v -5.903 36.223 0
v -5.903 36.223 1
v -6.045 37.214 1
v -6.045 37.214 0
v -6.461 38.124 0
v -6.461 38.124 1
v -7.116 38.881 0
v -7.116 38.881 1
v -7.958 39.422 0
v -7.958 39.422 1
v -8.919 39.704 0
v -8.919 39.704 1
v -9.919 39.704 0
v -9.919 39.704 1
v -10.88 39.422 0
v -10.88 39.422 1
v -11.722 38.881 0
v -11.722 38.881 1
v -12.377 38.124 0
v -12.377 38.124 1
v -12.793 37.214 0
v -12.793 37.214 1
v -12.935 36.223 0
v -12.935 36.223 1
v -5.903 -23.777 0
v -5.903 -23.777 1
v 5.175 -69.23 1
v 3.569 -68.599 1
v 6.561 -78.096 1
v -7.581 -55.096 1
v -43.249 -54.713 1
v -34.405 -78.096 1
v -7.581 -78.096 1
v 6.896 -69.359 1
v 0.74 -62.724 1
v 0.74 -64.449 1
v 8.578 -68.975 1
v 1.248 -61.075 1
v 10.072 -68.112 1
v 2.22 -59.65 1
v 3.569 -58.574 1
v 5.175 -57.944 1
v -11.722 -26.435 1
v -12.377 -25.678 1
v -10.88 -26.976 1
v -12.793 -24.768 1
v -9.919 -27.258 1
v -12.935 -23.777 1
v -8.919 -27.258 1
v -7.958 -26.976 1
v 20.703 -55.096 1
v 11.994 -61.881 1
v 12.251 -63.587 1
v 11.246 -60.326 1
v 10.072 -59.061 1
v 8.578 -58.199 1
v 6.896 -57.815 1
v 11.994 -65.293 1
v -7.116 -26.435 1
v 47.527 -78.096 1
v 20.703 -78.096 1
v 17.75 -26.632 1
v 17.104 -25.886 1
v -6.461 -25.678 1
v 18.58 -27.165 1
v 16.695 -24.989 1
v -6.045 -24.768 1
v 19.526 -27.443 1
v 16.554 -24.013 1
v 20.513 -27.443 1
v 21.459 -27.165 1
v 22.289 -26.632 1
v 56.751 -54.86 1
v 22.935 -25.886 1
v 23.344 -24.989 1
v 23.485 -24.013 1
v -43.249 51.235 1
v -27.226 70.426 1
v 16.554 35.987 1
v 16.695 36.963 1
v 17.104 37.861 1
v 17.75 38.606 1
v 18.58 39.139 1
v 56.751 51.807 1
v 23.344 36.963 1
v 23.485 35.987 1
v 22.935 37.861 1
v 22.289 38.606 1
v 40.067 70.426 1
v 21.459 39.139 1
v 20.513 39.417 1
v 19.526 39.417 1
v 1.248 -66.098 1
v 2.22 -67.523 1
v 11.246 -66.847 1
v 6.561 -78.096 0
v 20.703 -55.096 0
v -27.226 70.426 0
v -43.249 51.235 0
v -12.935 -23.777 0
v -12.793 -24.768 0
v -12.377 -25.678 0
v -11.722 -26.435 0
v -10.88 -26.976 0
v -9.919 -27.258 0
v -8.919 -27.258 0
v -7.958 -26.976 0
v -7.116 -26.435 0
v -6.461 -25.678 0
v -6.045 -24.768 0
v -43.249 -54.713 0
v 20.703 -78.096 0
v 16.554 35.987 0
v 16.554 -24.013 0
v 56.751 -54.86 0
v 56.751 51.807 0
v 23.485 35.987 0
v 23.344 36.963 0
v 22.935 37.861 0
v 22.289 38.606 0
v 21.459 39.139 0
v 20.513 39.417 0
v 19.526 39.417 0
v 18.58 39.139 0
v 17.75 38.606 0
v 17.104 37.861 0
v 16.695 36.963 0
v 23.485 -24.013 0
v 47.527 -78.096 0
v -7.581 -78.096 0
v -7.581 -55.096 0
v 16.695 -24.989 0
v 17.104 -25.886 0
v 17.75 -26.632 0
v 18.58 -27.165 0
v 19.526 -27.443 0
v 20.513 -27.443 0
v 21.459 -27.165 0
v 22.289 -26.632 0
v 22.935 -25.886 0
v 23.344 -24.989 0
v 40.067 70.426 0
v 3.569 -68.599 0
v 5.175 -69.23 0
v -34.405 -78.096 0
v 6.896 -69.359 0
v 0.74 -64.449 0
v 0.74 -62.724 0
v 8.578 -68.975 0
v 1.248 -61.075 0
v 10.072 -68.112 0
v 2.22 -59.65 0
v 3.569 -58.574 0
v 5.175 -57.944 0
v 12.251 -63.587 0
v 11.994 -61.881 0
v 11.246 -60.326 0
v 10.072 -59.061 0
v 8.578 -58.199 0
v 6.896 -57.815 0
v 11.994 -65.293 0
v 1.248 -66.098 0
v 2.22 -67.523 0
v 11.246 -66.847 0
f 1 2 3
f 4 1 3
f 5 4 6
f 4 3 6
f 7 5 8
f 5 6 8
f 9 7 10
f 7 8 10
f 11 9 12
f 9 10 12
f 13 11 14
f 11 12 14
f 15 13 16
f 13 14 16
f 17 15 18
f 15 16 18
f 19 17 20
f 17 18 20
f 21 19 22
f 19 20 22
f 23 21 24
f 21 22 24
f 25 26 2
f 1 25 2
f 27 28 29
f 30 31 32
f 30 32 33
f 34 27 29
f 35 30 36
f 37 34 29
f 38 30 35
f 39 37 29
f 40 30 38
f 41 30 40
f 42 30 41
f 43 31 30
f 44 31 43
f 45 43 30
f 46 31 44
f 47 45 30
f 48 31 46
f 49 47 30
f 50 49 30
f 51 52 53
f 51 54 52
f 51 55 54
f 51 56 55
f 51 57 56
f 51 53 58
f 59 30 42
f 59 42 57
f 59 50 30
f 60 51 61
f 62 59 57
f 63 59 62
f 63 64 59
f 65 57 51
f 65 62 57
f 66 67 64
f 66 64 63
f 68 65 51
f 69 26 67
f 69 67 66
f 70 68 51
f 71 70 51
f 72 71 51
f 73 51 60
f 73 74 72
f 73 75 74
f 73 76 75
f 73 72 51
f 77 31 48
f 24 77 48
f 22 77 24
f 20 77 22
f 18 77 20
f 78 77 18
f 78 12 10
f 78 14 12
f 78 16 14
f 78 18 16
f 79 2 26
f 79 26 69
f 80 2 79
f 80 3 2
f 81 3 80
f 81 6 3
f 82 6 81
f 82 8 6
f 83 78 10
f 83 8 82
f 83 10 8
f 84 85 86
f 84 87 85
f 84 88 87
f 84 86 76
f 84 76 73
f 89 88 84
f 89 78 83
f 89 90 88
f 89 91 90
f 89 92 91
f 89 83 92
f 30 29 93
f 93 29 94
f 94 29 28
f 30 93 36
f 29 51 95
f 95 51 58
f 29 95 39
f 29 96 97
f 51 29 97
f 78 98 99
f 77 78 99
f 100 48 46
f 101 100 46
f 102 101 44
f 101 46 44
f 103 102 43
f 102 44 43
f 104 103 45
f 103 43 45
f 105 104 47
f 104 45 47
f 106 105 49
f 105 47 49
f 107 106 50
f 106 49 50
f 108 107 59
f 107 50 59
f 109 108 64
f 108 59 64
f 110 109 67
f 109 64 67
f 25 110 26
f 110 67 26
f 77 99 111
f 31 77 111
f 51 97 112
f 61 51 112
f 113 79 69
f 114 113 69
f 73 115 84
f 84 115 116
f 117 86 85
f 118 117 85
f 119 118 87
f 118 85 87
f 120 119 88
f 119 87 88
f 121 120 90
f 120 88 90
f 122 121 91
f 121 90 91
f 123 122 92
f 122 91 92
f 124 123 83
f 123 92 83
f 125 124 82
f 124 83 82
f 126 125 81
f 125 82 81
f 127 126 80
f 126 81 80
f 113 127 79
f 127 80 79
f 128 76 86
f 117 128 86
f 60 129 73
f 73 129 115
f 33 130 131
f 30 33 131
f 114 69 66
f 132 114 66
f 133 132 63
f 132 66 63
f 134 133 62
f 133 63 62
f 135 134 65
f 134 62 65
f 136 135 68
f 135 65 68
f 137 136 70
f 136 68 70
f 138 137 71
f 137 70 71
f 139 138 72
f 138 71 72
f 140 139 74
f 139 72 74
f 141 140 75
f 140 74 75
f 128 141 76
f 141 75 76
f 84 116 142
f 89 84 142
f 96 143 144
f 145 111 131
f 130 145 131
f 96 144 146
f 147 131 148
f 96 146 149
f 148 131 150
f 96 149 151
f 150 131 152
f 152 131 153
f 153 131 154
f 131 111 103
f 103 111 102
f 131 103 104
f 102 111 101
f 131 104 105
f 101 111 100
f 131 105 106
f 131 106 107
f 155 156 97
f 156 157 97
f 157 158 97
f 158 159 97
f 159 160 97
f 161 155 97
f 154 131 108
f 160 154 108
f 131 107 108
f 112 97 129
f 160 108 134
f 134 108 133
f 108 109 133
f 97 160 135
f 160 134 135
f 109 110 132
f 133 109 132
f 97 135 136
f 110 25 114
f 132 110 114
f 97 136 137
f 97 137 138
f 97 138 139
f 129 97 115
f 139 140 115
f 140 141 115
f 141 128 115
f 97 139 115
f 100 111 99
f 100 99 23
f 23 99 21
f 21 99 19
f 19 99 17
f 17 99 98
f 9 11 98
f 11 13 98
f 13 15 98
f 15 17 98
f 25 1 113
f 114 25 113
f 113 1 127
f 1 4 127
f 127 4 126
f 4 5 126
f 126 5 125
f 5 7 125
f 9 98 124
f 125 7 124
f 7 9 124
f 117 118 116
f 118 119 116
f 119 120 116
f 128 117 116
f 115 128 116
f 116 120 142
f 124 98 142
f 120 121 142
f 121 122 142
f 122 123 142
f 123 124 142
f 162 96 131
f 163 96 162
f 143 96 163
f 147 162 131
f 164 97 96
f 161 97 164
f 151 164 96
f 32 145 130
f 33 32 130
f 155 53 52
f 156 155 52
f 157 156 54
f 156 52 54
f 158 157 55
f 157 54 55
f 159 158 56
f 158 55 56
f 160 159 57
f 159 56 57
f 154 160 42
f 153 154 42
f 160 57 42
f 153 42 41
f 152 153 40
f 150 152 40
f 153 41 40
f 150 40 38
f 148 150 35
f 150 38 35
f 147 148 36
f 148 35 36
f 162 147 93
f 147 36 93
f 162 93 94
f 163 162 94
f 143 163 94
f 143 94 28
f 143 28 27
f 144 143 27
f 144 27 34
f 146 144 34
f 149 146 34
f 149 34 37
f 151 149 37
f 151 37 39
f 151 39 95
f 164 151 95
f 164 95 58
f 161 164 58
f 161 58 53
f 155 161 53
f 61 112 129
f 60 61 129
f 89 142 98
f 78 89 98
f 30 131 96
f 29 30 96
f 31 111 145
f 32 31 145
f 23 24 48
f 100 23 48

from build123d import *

# Parameters (mm, degrees)
F1_DEPTH = 1
F3_DEPTH = 25
F5_DEPTH = 25
F6_DEPTH = 25
F2_R     = 5.7880952092
F7_DEPTH = 25


with BuildPart() as f1:
    # F0 (on Top) → F1 (new body)
    with BuildSketch(Plane.XY):
        Polygon((40.0670631063, 70.4256593338), (-27.2264379082, 70.4256593338), (-43.2491574436, 51.2352331091), (-43.2491574436, -54.7129847109), (-34.4047052506, -78.0962194188), (-7.5810035465, -78.0962194188), (-7.5810035465, -55.0962194188), (6.5611320772, -78.0962194188), (20.703267701, -55.0962194188), (20.703267701, -78.0962194188), (47.5269694051, -78.0962194188), (56.7508425564, -54.8600372004), (56.7508425564, 51.807079816), align=None)
    extrude(amount=F1_DEPTH)

    # F2 (on face) → F3 (cut)
    with BuildSketch(Plane.XY.offset(1)):
        with BuildLine():
            ThreePointArc((-5.9025767259, 36.2230366468), (-9.419005597, 39.7394655179), (-12.9354344681, 36.2230366468))
            Line((-12.9354344681, 36.2230366468), (-12.9354344681, -23.7769633532))
            ThreePointArc((-12.9354344681, -23.7769633532), (-9.419005597, -27.2933922242), (-5.9025767259, -23.7769633532))
            Line((-5.9025767259, -23.7769633532), (-5.9025767259, 36.2230366468))
        make_face()
    extrude(amount=-F3_DEPTH, mode=Mode.SUBTRACT)

    # F4 (on face) → F5 (cut)
    with BuildSketch(Plane.XY.offset(1)):
        with BuildLine():
            Line((16.5544010537, 35.9870965779), (16.5544010537, -24.0129034221))
            ThreePointArc((16.5544010537, -24.0129034221), (20.0195604854, -27.4780628539), (23.4847199172, -24.0129034221))
            Line((23.4847199172, -24.0129034221), (23.4847199172, 35.9870965779))
            ThreePointArc((23.4847199172, 35.9870965779), (20.0195604854, 39.4522560096), (16.5544010537, 35.9870965779))
        make_face()
    extrude(amount=-F5_DEPTH, mode=Mode.SUBTRACT)

    # F2 (on face) → F6 (cut)
    with BuildSketch(Plane.XY.offset(1)):
        with BuildLine():
            ThreePointArc((-5.9025767259, 36.2230366468), (-9.419005597, 39.7394655179), (-12.9354344681, 36.2230366468))
            Line((-12.9354344681, 36.2230366468), (-12.9354344681, -23.7769633532))
            ThreePointArc((-12.9354344681, -23.7769633532), (-9.419005597, -27.2933922242), (-5.9025767259, -23.7769633532))
            Line((-5.9025767259, -23.7769633532), (-5.9025767259, 36.2230366468))
        make_face()
    extrude(amount=-F6_DEPTH, mode=Mode.SUBTRACT)

    # F2 (on face) + F1_face1 (on face) → F7 (cut)
    with BuildSketch(Plane.XY.offset(1)):
        with BuildLine():
            ThreePointArc((-5.9025767259, 36.2230366468), (-9.419005597, 39.7394655179), (-12.9354344681, 36.2230366468))
            Line((-12.9354344681, 36.2230366468), (-12.9354344681, -23.7769633532))
            ThreePointArc((-12.9354344681, -23.7769633532), (-9.419005597, -27.2933922242), (-5.9025767259, -23.7769633532))
            Line((-5.9025767259, -23.7769633532), (-5.9025767259, 36.2230366468))
        make_face()
        with Locations((6.4631924033, -63.5865926743)):
            Circle(F2_R)
    with BuildSketch(Plane(origin=(6.8498182108, -3.4099472257, 0), x_dir=(1, 0, 0), z_dir=(0, 0, -1))):
        Polygon((33.2172448955, -73.8356065595), (49.9010243455, -55.2170270416), (49.9010243455, 51.4500899747), (40.6771511943, 74.6862721932), (13.8534494901, 74.6862721932), (13.8534494901, 51.6862721932), (-0.2886861336, 74.6862721932), (-14.4308217573, 51.6862721932), (-14.4308217573, 74.6862721932), (-41.2545234614, 74.6862721932), (-50.0989756545, 51.3030374853), (-50.0989756545, -54.6451803347), (-34.076256119, -73.8356065595), align=None)
        with BuildLine():
            Line((9.7045828429, -39.3970438035), (9.7045828429, 20.6029561965))
            ThreePointArc((9.7045828429, 20.6029561965), (13.1697422746, 24.0681156282), (16.6349017064, 20.6029561965))
            Line((16.6349017064, 20.6029561965), (16.6349017064, -39.3970438035))
            ThreePointArc((16.6349017064, -39.3970438035), (13.1697422746, -42.8622032353), (9.7045828429, -39.3970438035))
        make_face(mode=Mode.SUBTRACT)
        with BuildLine():
            Line((-12.7523949367, 20.3670161275), (-12.7523949367, -39.6329838725))
            ThreePointArc((-12.7523949367, -39.6329838725), (-16.2688238078, -43.1494127436), (-19.7852526789, -39.6329838725))
            Line((-19.7852526789, -39.6329838725), (-19.7852526789, 20.3670161275))
            ThreePointArc((-19.7852526789, 20.3670161275), (-16.2688238078, 23.8834449986), (-12.7523949367, 20.3670161275))
        make_face(mode=Mode.SUBTRACT)
    extrude(amount=-F7_DEPTH, dir=(0, 0, 1), mode=Mode.SUBTRACT)


solid = f1.part
